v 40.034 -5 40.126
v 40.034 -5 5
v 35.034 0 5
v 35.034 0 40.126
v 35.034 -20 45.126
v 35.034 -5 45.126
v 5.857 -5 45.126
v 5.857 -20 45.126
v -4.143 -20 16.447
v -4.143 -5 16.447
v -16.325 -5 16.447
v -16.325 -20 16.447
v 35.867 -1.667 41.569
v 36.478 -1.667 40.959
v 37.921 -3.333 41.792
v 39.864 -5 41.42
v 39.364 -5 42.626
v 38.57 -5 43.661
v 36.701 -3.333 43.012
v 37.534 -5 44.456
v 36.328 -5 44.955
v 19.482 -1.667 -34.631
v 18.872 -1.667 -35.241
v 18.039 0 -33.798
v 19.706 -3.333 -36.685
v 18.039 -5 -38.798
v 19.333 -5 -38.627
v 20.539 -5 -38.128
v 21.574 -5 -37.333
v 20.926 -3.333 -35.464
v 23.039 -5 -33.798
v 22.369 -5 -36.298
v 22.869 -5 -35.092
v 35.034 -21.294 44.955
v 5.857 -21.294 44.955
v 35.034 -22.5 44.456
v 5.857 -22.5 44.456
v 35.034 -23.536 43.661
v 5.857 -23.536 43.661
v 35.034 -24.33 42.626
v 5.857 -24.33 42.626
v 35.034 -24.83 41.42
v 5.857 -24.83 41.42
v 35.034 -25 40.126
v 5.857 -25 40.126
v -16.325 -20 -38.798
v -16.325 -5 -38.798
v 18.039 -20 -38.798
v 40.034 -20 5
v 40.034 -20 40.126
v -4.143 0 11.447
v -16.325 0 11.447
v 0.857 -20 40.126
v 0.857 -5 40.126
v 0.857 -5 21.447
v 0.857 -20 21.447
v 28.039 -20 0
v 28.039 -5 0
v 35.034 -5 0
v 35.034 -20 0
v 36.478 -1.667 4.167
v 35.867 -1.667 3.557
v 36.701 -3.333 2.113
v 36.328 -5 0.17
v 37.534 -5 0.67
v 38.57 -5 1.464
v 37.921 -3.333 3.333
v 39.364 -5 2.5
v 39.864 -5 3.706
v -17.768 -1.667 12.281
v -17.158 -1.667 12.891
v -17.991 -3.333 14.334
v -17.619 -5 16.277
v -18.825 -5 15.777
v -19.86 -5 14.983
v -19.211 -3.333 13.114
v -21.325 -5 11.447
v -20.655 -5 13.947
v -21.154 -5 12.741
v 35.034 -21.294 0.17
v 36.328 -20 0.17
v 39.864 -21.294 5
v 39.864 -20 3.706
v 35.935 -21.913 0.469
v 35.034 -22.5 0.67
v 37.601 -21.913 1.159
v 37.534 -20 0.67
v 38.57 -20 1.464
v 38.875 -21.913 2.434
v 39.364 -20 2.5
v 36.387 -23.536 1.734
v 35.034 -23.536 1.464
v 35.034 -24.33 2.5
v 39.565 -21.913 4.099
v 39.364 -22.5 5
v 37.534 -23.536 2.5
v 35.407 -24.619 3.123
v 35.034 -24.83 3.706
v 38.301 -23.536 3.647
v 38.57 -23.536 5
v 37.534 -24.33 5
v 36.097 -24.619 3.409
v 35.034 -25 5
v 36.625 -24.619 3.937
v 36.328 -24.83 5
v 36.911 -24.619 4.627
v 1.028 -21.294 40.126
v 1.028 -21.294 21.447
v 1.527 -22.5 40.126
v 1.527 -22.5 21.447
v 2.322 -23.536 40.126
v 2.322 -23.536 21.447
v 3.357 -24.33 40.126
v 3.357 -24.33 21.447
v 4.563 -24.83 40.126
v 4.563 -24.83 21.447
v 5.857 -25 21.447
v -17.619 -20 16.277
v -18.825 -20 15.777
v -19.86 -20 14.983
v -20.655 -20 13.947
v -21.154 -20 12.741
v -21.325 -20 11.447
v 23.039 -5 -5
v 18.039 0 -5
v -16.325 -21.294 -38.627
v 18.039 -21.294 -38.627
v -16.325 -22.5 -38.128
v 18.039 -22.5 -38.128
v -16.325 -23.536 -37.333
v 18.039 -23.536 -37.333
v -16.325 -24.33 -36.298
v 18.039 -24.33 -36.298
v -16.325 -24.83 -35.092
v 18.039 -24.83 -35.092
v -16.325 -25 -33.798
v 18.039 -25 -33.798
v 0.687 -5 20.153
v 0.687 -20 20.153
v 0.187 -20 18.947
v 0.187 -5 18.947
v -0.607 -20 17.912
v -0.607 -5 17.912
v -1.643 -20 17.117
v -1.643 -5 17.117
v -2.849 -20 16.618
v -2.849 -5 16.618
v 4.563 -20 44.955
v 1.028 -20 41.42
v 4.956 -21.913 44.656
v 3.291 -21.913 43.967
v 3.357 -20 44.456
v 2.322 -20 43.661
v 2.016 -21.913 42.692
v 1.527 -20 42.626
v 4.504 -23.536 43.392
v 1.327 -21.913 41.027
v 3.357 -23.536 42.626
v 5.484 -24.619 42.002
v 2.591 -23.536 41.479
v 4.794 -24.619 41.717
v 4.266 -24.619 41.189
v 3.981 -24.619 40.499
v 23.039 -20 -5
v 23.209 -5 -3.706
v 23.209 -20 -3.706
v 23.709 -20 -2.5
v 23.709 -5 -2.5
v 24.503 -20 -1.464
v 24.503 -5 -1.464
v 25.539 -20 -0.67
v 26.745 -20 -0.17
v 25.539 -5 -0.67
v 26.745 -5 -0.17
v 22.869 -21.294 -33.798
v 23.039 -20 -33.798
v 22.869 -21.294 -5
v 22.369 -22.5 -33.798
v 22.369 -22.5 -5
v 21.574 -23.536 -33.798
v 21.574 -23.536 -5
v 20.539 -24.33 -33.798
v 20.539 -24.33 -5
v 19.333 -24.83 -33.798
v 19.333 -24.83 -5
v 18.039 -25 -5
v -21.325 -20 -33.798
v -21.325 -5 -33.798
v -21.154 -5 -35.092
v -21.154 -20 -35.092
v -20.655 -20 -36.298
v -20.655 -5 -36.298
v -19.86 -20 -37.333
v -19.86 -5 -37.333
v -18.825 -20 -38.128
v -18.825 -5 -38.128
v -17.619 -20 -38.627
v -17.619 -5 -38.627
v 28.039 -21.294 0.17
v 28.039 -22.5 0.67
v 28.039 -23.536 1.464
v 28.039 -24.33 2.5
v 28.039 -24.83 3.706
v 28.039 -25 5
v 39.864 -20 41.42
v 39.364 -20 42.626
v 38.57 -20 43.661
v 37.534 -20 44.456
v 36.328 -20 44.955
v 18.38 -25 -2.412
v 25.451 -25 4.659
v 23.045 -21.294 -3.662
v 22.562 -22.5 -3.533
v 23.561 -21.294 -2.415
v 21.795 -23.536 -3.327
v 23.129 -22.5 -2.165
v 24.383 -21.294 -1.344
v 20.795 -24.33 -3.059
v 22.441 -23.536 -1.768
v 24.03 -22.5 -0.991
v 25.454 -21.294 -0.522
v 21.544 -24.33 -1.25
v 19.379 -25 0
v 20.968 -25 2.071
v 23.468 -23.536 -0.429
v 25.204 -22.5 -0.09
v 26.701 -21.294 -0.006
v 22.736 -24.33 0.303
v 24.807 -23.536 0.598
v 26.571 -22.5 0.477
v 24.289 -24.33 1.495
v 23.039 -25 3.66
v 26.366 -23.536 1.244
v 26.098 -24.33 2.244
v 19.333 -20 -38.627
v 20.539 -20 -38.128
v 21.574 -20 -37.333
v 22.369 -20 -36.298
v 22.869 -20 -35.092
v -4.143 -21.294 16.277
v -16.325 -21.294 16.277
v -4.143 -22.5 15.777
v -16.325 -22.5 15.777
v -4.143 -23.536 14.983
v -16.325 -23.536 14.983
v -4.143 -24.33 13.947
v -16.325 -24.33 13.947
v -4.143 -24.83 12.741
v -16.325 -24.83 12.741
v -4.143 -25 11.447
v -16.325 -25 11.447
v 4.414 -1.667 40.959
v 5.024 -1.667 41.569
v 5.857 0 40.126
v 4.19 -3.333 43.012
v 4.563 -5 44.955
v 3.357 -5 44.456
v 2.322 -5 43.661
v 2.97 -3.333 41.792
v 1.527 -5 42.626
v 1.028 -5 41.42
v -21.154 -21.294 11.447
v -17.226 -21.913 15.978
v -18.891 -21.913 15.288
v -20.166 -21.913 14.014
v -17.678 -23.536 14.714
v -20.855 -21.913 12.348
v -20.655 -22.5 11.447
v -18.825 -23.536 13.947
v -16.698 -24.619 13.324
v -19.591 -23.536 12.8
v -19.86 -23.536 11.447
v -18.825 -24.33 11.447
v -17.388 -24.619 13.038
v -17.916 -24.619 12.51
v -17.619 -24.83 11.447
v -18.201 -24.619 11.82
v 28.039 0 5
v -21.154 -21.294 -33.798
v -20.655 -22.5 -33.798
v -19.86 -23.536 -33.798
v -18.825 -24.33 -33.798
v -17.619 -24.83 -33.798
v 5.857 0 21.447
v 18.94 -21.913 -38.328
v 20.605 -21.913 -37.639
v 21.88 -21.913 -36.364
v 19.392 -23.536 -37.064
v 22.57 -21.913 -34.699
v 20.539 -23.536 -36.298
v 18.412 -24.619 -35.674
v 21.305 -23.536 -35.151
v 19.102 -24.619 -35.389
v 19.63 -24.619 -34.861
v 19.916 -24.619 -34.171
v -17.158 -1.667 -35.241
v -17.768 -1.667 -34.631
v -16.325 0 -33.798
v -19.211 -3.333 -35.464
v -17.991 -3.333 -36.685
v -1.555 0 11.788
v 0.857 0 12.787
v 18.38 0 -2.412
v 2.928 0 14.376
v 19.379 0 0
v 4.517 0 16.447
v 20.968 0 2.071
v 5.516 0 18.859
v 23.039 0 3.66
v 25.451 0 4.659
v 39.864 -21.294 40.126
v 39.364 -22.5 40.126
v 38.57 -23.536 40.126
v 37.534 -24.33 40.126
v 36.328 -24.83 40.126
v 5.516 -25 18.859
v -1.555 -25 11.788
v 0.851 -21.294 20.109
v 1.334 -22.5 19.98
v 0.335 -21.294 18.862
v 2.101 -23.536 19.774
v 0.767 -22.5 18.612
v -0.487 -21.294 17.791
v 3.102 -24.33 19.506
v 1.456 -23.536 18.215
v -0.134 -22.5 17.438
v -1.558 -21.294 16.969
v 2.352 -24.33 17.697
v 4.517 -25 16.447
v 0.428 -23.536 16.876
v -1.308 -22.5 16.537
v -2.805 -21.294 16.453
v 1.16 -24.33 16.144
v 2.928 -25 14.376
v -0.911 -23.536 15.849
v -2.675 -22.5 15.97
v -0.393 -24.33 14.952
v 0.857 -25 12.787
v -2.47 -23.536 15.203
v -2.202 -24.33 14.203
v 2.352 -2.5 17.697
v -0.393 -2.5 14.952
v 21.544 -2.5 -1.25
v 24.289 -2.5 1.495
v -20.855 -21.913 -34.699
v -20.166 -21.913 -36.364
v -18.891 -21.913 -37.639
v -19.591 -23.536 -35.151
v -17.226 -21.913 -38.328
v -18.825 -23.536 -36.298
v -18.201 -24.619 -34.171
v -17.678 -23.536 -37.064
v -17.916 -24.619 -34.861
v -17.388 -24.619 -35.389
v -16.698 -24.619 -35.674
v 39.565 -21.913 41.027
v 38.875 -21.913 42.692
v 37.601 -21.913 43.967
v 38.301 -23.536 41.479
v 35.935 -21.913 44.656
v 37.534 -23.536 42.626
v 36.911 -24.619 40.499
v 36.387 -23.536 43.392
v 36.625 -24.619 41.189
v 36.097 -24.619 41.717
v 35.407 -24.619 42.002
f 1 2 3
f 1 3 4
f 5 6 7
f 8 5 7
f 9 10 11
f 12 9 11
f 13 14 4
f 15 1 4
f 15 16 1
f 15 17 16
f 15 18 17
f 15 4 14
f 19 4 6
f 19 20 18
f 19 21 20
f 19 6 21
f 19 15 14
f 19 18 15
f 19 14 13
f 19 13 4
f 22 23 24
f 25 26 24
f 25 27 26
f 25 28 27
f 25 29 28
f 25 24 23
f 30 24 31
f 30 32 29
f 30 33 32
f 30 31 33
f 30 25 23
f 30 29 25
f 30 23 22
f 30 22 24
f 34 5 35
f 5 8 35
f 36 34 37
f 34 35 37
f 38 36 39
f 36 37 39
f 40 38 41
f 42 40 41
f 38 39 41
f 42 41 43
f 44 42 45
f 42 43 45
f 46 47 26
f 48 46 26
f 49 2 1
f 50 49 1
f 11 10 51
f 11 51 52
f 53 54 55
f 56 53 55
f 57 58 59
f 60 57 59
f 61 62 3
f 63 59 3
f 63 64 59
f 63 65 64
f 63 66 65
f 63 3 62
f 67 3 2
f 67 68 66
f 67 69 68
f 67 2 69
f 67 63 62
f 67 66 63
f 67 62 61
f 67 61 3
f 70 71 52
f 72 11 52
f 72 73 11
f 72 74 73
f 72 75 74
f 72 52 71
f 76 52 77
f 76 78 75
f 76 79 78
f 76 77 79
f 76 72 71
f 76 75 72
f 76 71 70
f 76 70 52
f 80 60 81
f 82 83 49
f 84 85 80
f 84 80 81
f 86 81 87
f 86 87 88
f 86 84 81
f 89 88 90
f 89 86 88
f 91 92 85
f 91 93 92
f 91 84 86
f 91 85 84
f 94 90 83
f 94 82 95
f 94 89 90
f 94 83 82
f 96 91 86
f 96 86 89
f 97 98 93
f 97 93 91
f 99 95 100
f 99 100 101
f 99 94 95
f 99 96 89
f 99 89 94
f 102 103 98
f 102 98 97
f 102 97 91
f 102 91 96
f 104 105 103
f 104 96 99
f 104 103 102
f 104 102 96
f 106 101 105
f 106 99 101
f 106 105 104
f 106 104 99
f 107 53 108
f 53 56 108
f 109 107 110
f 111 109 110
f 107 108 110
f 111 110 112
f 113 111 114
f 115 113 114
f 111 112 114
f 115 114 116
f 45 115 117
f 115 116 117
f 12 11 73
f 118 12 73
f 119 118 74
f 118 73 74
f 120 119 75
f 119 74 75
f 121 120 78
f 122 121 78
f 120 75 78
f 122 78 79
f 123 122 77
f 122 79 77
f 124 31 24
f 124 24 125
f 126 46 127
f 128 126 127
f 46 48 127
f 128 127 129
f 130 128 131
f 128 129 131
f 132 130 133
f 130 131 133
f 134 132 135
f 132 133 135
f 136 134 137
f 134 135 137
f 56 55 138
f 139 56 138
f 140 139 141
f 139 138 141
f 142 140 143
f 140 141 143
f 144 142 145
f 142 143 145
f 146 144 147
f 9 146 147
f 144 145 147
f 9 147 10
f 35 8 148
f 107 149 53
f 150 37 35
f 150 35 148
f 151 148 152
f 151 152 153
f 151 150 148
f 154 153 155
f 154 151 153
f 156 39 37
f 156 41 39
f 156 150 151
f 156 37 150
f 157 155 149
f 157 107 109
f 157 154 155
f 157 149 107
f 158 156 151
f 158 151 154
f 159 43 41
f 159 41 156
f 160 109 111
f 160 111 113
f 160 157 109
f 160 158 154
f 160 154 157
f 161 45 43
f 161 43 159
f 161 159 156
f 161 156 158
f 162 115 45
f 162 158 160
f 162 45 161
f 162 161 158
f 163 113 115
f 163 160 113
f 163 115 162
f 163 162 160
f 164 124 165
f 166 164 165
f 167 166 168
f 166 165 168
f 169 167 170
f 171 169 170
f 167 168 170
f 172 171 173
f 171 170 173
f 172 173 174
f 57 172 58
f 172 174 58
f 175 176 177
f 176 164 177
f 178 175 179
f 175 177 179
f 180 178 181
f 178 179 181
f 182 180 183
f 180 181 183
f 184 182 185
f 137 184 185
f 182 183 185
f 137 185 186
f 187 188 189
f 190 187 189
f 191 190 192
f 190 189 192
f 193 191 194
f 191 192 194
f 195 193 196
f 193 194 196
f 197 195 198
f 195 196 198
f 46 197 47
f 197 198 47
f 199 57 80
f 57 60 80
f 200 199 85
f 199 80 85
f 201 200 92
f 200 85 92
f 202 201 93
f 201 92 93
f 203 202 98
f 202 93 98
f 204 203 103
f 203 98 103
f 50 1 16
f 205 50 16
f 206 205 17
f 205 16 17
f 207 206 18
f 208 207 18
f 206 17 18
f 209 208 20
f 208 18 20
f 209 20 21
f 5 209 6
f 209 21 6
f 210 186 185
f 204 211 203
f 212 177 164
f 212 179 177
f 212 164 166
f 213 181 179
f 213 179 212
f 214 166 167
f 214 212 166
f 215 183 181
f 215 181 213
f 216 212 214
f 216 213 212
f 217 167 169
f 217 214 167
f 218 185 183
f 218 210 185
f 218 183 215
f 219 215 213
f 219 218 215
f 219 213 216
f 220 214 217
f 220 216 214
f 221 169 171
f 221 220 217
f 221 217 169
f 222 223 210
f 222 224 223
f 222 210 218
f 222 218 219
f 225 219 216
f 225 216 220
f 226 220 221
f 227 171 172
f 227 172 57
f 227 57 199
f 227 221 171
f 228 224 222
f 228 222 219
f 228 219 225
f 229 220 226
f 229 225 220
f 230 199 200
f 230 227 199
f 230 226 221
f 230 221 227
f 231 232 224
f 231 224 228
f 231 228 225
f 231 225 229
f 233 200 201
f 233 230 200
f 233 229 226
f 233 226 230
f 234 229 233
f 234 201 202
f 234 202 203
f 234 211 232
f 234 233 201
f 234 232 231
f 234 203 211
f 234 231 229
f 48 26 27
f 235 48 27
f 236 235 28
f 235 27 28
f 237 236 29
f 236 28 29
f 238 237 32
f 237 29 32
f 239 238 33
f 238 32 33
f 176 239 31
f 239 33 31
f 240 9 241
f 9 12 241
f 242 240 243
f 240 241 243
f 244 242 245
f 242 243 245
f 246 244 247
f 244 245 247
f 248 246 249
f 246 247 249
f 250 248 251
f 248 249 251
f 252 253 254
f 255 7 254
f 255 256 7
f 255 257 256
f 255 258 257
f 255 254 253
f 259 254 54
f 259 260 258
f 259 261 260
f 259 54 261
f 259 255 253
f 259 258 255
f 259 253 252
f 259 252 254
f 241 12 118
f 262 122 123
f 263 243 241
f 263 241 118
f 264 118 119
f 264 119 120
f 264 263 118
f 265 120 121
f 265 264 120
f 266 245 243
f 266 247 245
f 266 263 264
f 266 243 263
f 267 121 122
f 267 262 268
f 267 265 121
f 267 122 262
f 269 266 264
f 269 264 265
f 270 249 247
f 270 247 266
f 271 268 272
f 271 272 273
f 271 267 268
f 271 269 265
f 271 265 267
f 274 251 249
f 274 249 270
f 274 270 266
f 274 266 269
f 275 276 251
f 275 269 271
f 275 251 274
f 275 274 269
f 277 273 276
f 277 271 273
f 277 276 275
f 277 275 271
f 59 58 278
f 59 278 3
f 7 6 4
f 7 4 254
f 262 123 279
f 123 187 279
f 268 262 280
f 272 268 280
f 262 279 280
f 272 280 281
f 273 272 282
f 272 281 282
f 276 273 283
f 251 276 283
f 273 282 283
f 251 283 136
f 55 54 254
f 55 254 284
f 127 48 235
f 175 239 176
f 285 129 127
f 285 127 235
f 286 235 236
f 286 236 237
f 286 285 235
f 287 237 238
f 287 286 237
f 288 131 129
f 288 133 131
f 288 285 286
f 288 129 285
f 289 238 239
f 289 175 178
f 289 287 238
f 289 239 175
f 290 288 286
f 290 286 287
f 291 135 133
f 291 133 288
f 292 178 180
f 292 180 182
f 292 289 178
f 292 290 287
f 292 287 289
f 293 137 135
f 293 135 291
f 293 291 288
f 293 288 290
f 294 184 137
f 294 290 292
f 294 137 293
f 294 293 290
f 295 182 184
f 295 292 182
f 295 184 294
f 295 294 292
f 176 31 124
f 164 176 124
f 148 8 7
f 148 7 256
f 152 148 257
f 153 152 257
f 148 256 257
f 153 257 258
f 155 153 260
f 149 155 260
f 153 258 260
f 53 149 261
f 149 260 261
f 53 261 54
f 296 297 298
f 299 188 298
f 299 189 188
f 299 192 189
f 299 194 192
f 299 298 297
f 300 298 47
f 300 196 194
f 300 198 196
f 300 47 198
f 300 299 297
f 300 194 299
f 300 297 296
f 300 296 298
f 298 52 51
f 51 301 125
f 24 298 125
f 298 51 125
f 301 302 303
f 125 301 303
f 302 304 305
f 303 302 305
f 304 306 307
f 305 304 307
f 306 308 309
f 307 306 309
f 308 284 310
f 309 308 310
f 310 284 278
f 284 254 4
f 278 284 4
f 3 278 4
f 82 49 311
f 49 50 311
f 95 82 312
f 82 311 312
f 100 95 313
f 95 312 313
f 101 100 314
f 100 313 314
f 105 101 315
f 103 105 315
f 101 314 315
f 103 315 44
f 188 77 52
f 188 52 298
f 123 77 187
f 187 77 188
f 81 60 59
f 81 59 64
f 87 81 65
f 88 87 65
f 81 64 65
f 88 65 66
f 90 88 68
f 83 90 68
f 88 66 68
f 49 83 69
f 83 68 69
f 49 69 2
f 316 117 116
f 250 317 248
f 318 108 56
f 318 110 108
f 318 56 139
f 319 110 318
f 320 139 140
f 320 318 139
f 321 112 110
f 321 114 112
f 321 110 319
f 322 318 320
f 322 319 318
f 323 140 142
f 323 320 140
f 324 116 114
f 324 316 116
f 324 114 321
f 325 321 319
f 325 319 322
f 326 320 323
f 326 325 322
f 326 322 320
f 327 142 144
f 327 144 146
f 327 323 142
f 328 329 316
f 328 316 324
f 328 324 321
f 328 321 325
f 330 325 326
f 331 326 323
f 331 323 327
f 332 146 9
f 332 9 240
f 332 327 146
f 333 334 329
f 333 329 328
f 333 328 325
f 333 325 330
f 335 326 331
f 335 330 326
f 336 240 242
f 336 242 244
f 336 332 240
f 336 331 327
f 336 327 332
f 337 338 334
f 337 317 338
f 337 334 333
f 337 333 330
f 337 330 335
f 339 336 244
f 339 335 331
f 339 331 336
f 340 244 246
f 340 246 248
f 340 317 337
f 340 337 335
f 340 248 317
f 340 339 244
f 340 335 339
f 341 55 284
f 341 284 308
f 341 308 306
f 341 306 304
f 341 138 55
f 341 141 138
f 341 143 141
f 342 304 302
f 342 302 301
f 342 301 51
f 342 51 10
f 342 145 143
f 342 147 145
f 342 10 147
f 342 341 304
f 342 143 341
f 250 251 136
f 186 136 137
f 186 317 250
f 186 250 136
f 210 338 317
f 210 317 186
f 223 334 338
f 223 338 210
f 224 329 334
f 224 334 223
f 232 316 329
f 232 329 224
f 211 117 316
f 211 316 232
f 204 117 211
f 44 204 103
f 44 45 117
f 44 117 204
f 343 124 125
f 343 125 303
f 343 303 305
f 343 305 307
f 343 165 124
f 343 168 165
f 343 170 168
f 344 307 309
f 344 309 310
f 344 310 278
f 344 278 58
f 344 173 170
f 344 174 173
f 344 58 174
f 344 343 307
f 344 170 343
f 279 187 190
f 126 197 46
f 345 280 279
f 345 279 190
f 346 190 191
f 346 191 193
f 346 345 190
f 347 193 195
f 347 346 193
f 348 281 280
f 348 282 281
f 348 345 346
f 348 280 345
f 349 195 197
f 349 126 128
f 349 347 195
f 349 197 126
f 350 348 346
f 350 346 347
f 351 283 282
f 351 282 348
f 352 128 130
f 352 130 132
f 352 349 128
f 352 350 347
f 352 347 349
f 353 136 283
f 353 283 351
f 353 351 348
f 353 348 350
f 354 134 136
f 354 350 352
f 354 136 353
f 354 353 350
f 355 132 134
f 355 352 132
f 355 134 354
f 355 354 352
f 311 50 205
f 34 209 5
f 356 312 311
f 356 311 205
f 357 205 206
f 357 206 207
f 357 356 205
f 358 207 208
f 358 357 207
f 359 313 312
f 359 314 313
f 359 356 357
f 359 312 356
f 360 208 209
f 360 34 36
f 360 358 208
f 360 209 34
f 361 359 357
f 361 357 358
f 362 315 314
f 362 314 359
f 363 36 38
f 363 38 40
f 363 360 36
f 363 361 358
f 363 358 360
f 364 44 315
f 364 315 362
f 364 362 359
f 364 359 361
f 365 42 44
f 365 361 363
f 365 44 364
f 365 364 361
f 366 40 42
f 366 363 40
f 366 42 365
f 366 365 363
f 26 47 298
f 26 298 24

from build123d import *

# Parameters (mm, degrees)
F1_DEPTH = 25
F2_R     = 5
F3_SIZE  = 4.99999


# Not quite as in the source:
# - a fillet or chamfer is up to 0.001 mm smaller than in the source, because OpenCascade refuses the exact size


with BuildPart() as f1:
    # F0 (on Front) → F1 (new body)
    with BuildSketch(Plane.XZ):
        with BuildLine():
            Line((-4.1428460926, 16.4471715689), (-16.3246531785, 16.4471715689))
            ThreePointArc((-16.3246531785, 16.4471715689), (-19.8601870844, 14.9827054748), (-21.3246531785, 11.4471715689))
            Line((-21.3246531785, 11.4471715689), (-21.3246531785, -33.7977808714))
            ThreePointArc((-21.3246531785, -33.7977808714), (-19.8601870844, -37.3333147773), (-16.3246531785, -38.7977808714))
            Line((-16.3246531785, -38.7977808714), (18.0389609933, -38.7977808714))
            ThreePointArc((18.0389609933, -38.7977808714), (21.5744948992, -37.3333147773), (23.0389609933, -33.7977808714))
            Line((23.0389609933, -33.7977808714), (23.0389609933, -5))
            ThreePointArc((23.0389609933, -5), (24.5034270874, -1.4644660941), (28.0389609933, 0))
            Line((28.0389609933, 0), (35.034160018, 0))
            ThreePointArc((35.034160018, 0), (38.5696939239, 1.4644660941), (40.034160018, 5))
            Line((40.034160018, 5), (40.034160018, 40.125707984))
            ThreePointArc((40.034160018, 40.125707984), (38.5696939239, 43.6612418899), (35.034160018, 45.125707984))
            Line((35.034160018, 45.125707984), (5.8571539074, 45.125707984))
            ThreePointArc((5.8571539074, 45.125707984), (2.3216200015, 43.6612418899), (0.8571539074, 40.125707984))
            Line((0.8571539074, 40.125707984), (0.8571539074, 21.4471715689))
            ThreePointArc((0.8571539074, 21.4471715689), (-0.6073121866, 17.9116376629), (-4.1428460926, 16.4471715689))
        make_face()
    extrude(amount=F1_DEPTH)

    # F2
    f2_edges = [f1.edges().sort_by_distance(p)[0] for p in [
        (0.857154, -25, -38.797781),
    ]]
    fillet(f2_edges, radius=F2_R)

    # F3 (size 5 in the source; OpenCascade refuses exactly that, so slightly less here)
    f3_edges = [f1.edges().sort_by_distance(p)[0] for p in [
        (20.445657, 0, 45.125708),
        (2.32162, 0, 43.661242),
        (0.857154, 0, 30.78644),
        (-0.607312, 0, 17.911638),
        (-10.23375, 0, 16.447172),
        (-19.860187, 0, 14.982705),
        (-21.324653, 0, -11.175305),
        (-19.860187, 0, -37.333315),
        (0.857154, 0, -38.797781),
        (21.574495, 0, -37.333315),
        (23.038961, 0, -19.39889),
        (24.503427, 0, -1.464466),
        (31.536561, 0, 0),
        (38.569694, 0, 1.464466),
        (40.03416, 0, 22.562854),
        (38.569694, 0, 43.661242),
    ]]
    chamfer(f3_edges, length=F3_SIZE)


solid = f1.part
